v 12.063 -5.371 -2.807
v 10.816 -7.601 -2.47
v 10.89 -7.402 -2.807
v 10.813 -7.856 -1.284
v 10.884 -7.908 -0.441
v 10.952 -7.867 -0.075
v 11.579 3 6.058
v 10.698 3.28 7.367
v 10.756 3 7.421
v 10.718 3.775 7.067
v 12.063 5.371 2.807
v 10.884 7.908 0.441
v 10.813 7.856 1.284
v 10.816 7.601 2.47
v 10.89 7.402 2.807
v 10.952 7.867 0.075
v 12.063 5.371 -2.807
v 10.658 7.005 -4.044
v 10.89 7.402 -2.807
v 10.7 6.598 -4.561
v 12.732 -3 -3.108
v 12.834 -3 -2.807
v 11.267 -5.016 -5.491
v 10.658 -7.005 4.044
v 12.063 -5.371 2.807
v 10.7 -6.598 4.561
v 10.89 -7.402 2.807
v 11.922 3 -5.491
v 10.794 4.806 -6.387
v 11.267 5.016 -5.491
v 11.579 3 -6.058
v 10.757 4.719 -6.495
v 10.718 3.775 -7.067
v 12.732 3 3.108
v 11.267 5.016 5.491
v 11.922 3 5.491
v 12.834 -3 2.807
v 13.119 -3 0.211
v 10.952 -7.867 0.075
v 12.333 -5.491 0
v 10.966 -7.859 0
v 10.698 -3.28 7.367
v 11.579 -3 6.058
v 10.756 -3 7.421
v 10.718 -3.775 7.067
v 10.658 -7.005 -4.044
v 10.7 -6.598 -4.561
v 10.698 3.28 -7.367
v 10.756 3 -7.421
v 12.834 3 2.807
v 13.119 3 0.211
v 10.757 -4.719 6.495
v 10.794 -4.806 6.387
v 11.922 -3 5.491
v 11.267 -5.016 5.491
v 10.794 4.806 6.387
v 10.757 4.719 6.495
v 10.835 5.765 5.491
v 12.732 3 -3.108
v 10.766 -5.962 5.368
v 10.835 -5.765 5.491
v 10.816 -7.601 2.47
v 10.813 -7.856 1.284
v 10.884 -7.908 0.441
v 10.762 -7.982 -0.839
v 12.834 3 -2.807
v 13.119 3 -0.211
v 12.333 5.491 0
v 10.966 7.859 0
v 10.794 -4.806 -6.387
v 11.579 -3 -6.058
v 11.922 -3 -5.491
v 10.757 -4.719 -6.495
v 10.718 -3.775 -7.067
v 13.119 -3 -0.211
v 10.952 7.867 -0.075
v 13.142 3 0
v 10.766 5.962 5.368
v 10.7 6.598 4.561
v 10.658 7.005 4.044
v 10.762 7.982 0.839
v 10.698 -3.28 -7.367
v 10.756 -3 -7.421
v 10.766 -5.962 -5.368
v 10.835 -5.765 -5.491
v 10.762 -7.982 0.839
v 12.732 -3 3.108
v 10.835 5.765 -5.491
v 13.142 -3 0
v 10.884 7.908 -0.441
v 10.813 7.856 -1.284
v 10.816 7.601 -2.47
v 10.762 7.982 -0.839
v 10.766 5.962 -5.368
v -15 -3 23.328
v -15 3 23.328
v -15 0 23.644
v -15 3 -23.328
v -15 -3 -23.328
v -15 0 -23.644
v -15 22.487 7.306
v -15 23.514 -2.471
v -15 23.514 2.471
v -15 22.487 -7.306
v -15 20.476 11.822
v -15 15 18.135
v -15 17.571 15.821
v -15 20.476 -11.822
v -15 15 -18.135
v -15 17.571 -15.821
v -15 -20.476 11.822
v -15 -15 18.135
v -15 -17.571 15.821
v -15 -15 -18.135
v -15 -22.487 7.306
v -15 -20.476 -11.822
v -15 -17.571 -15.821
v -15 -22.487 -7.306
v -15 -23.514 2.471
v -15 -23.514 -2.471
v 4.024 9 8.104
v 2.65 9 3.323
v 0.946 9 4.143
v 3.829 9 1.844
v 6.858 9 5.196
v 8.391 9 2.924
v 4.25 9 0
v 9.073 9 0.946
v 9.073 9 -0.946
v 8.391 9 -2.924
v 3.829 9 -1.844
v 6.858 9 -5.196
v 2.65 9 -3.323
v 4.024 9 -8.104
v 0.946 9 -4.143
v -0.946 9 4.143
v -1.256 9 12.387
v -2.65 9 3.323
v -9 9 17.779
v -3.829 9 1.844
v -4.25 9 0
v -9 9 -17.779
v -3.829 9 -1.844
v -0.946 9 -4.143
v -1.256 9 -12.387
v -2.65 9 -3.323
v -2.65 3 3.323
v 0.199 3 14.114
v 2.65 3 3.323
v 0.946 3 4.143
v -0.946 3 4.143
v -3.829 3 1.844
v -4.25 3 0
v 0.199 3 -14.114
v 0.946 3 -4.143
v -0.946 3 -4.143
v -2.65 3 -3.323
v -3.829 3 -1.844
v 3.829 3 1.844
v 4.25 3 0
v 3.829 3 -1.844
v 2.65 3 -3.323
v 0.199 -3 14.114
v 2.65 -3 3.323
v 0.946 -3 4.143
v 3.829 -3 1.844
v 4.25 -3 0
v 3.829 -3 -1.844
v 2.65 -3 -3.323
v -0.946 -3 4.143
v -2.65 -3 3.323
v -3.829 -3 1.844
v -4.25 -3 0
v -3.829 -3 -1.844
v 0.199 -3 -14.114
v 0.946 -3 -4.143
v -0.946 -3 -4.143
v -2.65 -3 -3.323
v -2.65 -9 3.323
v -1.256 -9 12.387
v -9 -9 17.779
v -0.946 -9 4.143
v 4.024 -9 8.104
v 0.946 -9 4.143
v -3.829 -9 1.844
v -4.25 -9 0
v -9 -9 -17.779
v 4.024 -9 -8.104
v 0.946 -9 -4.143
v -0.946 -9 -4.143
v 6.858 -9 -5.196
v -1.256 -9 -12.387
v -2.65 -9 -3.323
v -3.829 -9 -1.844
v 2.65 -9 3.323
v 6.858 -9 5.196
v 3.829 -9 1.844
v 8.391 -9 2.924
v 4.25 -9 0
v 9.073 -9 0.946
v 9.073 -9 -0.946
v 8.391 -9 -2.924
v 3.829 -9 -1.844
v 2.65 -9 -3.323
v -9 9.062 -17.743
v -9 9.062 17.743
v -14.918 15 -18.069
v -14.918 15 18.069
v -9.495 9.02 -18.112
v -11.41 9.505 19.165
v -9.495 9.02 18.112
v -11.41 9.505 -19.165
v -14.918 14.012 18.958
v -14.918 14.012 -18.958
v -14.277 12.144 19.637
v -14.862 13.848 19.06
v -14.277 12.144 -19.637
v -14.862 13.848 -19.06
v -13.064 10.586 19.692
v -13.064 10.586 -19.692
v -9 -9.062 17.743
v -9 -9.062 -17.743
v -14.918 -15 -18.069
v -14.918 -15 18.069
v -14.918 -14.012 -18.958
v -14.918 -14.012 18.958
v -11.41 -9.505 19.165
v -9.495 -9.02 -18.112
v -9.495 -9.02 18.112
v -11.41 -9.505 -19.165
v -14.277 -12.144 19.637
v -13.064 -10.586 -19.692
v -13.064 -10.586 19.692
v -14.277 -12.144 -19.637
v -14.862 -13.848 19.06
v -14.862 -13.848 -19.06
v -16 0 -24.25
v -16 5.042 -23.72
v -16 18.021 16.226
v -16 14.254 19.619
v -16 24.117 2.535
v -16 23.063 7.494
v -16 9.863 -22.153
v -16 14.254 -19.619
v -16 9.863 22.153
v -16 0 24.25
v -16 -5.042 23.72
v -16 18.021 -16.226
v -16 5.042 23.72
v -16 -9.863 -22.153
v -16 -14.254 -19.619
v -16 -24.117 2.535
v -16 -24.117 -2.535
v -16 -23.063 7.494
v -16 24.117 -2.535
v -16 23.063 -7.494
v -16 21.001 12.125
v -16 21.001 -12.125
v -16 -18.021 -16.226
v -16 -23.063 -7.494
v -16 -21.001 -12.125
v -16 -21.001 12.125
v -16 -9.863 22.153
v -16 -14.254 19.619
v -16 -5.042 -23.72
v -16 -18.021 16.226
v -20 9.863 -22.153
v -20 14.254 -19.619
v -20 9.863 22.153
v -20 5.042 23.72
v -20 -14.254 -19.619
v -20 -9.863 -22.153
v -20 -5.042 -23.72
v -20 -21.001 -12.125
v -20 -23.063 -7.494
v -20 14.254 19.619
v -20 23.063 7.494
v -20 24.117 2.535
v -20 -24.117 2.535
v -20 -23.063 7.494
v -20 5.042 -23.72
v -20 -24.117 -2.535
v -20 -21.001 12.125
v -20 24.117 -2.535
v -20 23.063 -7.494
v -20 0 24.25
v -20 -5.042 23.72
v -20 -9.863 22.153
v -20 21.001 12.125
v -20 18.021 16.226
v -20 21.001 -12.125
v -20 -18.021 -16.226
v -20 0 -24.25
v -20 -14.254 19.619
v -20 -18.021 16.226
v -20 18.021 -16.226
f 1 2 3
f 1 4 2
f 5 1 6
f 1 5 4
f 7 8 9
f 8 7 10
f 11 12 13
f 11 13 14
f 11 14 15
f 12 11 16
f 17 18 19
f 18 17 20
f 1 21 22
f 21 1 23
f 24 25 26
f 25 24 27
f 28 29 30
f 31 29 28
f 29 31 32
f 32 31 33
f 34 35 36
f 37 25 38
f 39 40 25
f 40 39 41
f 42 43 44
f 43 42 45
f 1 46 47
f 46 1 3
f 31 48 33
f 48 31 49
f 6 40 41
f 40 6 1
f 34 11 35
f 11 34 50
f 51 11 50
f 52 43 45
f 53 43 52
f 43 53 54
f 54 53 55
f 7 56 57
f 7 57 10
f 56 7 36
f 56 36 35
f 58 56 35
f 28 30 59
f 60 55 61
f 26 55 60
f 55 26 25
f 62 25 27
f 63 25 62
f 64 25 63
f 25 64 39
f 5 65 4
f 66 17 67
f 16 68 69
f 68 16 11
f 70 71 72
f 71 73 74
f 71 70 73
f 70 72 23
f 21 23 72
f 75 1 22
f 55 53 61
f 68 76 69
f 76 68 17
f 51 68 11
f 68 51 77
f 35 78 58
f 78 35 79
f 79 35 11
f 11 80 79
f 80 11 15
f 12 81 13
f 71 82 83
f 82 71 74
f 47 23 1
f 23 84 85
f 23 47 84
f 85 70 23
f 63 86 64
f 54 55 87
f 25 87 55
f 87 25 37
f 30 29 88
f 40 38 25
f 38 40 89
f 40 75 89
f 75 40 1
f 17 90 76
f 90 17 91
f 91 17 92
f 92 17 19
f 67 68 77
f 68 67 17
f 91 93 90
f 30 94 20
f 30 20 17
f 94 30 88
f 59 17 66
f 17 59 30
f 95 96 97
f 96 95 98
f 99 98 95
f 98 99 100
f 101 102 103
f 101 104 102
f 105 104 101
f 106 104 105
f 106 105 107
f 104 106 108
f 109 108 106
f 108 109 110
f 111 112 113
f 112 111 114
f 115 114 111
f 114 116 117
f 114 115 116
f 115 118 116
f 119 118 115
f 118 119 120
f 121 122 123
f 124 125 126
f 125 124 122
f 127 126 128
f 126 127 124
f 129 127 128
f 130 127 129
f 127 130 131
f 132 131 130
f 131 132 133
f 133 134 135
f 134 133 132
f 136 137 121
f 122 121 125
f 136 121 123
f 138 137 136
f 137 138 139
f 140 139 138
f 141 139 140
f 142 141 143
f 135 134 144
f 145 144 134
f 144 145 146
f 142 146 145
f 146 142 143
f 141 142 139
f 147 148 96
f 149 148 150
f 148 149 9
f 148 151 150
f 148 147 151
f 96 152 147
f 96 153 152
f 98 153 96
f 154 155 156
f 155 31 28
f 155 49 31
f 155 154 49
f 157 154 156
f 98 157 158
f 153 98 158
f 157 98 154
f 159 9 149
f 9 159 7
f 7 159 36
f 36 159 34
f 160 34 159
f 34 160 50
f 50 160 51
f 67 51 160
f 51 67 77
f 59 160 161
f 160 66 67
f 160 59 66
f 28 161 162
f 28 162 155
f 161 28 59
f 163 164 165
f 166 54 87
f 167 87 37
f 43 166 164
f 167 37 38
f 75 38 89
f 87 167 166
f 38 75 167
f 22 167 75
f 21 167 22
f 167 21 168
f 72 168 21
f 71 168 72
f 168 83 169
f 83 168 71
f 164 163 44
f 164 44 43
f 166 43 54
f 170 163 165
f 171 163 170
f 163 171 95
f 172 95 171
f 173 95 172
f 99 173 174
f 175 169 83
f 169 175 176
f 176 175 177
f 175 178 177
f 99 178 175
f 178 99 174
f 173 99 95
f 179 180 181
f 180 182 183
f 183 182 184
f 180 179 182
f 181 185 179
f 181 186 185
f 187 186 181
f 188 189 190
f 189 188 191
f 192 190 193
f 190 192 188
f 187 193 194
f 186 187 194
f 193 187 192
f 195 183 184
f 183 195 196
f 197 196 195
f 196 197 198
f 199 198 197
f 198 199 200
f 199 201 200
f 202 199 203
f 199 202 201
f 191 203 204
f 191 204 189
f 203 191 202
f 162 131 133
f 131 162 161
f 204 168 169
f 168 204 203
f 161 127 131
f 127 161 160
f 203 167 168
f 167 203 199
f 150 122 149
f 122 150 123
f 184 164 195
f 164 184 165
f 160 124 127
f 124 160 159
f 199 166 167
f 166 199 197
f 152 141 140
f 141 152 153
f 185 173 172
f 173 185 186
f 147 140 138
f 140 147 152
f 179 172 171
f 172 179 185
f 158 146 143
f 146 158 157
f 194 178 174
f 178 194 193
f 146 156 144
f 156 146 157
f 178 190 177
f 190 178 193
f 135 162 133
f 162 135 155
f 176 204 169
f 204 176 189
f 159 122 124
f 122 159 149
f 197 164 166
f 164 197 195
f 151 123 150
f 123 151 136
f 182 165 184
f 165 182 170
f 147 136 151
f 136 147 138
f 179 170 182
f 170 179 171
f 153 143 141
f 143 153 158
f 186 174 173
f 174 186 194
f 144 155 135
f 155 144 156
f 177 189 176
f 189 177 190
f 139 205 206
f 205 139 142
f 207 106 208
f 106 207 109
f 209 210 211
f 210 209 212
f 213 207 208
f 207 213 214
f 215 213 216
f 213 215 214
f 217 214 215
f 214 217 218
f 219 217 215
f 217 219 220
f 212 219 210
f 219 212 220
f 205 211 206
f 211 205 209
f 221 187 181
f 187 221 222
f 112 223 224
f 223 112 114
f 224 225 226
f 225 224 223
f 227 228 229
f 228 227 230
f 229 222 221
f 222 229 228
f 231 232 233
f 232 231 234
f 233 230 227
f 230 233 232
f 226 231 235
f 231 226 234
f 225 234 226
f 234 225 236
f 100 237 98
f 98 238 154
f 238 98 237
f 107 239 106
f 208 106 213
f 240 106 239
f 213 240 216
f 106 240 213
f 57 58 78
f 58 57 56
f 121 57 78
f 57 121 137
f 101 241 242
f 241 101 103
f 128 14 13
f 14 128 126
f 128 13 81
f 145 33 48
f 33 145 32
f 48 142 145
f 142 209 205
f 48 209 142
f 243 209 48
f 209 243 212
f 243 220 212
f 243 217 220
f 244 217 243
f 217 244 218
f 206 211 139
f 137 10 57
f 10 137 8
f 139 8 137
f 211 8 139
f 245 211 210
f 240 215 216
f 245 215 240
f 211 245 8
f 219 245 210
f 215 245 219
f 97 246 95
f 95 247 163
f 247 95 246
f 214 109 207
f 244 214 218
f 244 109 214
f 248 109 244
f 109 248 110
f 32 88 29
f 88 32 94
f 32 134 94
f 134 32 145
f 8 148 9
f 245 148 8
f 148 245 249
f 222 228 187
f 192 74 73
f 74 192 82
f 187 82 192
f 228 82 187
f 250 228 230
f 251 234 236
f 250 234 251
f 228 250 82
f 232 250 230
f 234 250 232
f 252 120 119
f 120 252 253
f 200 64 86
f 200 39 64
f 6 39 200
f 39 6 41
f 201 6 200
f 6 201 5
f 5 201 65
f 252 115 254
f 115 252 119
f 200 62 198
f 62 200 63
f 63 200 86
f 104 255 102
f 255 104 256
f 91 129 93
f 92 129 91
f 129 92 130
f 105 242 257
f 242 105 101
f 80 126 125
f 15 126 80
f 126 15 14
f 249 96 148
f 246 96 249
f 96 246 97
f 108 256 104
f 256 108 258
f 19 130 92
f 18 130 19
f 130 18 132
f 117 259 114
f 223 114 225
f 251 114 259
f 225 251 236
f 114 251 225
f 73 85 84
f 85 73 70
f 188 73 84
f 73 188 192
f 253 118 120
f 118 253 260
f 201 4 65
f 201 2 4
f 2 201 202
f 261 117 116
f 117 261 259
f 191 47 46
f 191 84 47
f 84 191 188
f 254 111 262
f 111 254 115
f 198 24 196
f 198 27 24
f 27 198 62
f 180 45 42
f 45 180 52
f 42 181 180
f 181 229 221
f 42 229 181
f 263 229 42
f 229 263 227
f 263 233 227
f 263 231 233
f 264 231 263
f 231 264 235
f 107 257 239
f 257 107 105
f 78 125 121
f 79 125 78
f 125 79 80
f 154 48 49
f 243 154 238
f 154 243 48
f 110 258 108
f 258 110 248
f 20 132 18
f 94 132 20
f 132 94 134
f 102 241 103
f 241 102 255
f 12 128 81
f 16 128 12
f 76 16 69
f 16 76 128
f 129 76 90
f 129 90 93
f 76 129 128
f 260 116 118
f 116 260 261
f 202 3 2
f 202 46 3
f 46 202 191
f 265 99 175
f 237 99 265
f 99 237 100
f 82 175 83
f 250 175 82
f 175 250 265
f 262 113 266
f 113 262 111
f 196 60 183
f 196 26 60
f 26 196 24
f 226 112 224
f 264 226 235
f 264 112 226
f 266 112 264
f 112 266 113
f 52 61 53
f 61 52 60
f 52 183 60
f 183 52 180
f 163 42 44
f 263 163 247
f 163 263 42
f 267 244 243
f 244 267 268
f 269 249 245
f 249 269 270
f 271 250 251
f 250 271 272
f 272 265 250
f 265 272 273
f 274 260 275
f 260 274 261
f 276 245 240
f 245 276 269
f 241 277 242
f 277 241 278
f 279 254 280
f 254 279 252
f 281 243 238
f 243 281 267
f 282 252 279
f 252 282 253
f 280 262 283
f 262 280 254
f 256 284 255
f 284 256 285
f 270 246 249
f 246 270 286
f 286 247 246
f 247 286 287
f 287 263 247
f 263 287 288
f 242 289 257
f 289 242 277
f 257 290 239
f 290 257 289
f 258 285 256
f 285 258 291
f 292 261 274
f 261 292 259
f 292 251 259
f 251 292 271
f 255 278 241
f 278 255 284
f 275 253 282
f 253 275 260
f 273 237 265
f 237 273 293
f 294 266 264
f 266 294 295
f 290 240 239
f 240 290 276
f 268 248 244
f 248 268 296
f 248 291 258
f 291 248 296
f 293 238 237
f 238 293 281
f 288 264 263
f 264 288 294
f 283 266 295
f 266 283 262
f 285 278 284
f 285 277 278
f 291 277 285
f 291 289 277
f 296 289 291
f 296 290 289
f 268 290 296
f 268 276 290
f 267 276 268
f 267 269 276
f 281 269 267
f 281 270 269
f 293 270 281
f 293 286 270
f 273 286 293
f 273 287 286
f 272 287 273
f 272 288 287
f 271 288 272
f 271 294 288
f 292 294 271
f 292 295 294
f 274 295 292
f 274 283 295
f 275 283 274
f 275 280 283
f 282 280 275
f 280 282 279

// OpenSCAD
ShplRoz();

    gikLen = 2200;
    diamVnesh = 48.5;
    platformThickns = 5;
    ushiThickns = 6;
    lenA = 40;
    shplintDia = 8.5;
    shplintHoleHeight = 15;

module ShplRoz() {

    intersection() {
        
        union() {
            
            //Цилиндр
            translate([+platformThickns-1,0,0]) 
            rotate([0,-90,0]) 
            cylinder(h=shplintHoleHeight+platformThickns, d=diamVnesh);   // Эта часть такая, какая нужна.    

            // Сфера
            sphere(d = ushiThickns*4.5);
       } 

       ConicBar();

    }

    //Цилиндр затычки, высотой 4мм 
    translate([-shplintHoleHeight-1,0,0]) 
    rotate([0,-90,0]) 
    cylinder(h=platformThickns-1, d=diamVnesh);    

}




module ConicBar() {
    
    intersection() { 

        union() {
                                        
            // Шайба 1мм
            translate([-shplintHoleHeight,0,0]) 
            rotate([0,-90,0]) 
            cylinder(h=1, d=diamVnesh);
    
            // Захваты упора с дырками.
            difference(){ 
                    
                // Захваты упора.
                union() {  
                    translate([-shplintHoleHeight,ushiThickns /2 ,-diamVnesh/2]) 
                    cube([lenA,ushiThickns ,diamVnesh]);    

                    translate([-shplintHoleHeight,-3*ushiThickns /2 ,-diamVnesh/2]) 
                    cube([lenA,ushiThickns ,diamVnesh]);
                        
                }
                    
                // Дырки для шплинта ( вырез цилиндра )
                translate([0 ,-1-ushiThickns*3/2,0]) 
                rotate([-90,0,0]) 
                cylinder(h=ushiThickns *3+2, d=shplintDia); 

            }
        
            // Стыки
            difference() {

                translate([-shplintHoleHeight,3*ushiThickns /2 ,-diamVnesh/2]) 
                cube([ushiThickns,ushiThickns ,diamVnesh]);    

                translate([-shplintHoleHeight + ushiThickns,5*ushiThickns/2,-diamVnesh/2]) 
                rotate([0,0,0]) 
                cylinder(h=diamVnesh, d=ushiThickns*2  );       
            }
            difference() {

                translate([-shplintHoleHeight,-5*ushiThickns /2 ,-diamVnesh/2]) 
                cube([ushiThickns,ushiThickns ,diamVnesh]);      

                translate([-shplintHoleHeight + ushiThickns,-5*ushiThickns/2,-diamVnesh/2]) 
                rotate([0,0,0]) 
                cylinder(h=diamVnesh, d=ushiThickns*2  );       
            }   
        
        }

        // Конус. Нужно оставить то, что в нём.
        translate([-shplintHoleHeight-1,0,0]) 
        rotate([0,90,0]) 
        cylinder(h=platformThickns*8, d1=diamVnesh, d2=0);   // Пересекаем с этим конусом.
   
    } // Пересечение
}   // Модуль ConicBar
